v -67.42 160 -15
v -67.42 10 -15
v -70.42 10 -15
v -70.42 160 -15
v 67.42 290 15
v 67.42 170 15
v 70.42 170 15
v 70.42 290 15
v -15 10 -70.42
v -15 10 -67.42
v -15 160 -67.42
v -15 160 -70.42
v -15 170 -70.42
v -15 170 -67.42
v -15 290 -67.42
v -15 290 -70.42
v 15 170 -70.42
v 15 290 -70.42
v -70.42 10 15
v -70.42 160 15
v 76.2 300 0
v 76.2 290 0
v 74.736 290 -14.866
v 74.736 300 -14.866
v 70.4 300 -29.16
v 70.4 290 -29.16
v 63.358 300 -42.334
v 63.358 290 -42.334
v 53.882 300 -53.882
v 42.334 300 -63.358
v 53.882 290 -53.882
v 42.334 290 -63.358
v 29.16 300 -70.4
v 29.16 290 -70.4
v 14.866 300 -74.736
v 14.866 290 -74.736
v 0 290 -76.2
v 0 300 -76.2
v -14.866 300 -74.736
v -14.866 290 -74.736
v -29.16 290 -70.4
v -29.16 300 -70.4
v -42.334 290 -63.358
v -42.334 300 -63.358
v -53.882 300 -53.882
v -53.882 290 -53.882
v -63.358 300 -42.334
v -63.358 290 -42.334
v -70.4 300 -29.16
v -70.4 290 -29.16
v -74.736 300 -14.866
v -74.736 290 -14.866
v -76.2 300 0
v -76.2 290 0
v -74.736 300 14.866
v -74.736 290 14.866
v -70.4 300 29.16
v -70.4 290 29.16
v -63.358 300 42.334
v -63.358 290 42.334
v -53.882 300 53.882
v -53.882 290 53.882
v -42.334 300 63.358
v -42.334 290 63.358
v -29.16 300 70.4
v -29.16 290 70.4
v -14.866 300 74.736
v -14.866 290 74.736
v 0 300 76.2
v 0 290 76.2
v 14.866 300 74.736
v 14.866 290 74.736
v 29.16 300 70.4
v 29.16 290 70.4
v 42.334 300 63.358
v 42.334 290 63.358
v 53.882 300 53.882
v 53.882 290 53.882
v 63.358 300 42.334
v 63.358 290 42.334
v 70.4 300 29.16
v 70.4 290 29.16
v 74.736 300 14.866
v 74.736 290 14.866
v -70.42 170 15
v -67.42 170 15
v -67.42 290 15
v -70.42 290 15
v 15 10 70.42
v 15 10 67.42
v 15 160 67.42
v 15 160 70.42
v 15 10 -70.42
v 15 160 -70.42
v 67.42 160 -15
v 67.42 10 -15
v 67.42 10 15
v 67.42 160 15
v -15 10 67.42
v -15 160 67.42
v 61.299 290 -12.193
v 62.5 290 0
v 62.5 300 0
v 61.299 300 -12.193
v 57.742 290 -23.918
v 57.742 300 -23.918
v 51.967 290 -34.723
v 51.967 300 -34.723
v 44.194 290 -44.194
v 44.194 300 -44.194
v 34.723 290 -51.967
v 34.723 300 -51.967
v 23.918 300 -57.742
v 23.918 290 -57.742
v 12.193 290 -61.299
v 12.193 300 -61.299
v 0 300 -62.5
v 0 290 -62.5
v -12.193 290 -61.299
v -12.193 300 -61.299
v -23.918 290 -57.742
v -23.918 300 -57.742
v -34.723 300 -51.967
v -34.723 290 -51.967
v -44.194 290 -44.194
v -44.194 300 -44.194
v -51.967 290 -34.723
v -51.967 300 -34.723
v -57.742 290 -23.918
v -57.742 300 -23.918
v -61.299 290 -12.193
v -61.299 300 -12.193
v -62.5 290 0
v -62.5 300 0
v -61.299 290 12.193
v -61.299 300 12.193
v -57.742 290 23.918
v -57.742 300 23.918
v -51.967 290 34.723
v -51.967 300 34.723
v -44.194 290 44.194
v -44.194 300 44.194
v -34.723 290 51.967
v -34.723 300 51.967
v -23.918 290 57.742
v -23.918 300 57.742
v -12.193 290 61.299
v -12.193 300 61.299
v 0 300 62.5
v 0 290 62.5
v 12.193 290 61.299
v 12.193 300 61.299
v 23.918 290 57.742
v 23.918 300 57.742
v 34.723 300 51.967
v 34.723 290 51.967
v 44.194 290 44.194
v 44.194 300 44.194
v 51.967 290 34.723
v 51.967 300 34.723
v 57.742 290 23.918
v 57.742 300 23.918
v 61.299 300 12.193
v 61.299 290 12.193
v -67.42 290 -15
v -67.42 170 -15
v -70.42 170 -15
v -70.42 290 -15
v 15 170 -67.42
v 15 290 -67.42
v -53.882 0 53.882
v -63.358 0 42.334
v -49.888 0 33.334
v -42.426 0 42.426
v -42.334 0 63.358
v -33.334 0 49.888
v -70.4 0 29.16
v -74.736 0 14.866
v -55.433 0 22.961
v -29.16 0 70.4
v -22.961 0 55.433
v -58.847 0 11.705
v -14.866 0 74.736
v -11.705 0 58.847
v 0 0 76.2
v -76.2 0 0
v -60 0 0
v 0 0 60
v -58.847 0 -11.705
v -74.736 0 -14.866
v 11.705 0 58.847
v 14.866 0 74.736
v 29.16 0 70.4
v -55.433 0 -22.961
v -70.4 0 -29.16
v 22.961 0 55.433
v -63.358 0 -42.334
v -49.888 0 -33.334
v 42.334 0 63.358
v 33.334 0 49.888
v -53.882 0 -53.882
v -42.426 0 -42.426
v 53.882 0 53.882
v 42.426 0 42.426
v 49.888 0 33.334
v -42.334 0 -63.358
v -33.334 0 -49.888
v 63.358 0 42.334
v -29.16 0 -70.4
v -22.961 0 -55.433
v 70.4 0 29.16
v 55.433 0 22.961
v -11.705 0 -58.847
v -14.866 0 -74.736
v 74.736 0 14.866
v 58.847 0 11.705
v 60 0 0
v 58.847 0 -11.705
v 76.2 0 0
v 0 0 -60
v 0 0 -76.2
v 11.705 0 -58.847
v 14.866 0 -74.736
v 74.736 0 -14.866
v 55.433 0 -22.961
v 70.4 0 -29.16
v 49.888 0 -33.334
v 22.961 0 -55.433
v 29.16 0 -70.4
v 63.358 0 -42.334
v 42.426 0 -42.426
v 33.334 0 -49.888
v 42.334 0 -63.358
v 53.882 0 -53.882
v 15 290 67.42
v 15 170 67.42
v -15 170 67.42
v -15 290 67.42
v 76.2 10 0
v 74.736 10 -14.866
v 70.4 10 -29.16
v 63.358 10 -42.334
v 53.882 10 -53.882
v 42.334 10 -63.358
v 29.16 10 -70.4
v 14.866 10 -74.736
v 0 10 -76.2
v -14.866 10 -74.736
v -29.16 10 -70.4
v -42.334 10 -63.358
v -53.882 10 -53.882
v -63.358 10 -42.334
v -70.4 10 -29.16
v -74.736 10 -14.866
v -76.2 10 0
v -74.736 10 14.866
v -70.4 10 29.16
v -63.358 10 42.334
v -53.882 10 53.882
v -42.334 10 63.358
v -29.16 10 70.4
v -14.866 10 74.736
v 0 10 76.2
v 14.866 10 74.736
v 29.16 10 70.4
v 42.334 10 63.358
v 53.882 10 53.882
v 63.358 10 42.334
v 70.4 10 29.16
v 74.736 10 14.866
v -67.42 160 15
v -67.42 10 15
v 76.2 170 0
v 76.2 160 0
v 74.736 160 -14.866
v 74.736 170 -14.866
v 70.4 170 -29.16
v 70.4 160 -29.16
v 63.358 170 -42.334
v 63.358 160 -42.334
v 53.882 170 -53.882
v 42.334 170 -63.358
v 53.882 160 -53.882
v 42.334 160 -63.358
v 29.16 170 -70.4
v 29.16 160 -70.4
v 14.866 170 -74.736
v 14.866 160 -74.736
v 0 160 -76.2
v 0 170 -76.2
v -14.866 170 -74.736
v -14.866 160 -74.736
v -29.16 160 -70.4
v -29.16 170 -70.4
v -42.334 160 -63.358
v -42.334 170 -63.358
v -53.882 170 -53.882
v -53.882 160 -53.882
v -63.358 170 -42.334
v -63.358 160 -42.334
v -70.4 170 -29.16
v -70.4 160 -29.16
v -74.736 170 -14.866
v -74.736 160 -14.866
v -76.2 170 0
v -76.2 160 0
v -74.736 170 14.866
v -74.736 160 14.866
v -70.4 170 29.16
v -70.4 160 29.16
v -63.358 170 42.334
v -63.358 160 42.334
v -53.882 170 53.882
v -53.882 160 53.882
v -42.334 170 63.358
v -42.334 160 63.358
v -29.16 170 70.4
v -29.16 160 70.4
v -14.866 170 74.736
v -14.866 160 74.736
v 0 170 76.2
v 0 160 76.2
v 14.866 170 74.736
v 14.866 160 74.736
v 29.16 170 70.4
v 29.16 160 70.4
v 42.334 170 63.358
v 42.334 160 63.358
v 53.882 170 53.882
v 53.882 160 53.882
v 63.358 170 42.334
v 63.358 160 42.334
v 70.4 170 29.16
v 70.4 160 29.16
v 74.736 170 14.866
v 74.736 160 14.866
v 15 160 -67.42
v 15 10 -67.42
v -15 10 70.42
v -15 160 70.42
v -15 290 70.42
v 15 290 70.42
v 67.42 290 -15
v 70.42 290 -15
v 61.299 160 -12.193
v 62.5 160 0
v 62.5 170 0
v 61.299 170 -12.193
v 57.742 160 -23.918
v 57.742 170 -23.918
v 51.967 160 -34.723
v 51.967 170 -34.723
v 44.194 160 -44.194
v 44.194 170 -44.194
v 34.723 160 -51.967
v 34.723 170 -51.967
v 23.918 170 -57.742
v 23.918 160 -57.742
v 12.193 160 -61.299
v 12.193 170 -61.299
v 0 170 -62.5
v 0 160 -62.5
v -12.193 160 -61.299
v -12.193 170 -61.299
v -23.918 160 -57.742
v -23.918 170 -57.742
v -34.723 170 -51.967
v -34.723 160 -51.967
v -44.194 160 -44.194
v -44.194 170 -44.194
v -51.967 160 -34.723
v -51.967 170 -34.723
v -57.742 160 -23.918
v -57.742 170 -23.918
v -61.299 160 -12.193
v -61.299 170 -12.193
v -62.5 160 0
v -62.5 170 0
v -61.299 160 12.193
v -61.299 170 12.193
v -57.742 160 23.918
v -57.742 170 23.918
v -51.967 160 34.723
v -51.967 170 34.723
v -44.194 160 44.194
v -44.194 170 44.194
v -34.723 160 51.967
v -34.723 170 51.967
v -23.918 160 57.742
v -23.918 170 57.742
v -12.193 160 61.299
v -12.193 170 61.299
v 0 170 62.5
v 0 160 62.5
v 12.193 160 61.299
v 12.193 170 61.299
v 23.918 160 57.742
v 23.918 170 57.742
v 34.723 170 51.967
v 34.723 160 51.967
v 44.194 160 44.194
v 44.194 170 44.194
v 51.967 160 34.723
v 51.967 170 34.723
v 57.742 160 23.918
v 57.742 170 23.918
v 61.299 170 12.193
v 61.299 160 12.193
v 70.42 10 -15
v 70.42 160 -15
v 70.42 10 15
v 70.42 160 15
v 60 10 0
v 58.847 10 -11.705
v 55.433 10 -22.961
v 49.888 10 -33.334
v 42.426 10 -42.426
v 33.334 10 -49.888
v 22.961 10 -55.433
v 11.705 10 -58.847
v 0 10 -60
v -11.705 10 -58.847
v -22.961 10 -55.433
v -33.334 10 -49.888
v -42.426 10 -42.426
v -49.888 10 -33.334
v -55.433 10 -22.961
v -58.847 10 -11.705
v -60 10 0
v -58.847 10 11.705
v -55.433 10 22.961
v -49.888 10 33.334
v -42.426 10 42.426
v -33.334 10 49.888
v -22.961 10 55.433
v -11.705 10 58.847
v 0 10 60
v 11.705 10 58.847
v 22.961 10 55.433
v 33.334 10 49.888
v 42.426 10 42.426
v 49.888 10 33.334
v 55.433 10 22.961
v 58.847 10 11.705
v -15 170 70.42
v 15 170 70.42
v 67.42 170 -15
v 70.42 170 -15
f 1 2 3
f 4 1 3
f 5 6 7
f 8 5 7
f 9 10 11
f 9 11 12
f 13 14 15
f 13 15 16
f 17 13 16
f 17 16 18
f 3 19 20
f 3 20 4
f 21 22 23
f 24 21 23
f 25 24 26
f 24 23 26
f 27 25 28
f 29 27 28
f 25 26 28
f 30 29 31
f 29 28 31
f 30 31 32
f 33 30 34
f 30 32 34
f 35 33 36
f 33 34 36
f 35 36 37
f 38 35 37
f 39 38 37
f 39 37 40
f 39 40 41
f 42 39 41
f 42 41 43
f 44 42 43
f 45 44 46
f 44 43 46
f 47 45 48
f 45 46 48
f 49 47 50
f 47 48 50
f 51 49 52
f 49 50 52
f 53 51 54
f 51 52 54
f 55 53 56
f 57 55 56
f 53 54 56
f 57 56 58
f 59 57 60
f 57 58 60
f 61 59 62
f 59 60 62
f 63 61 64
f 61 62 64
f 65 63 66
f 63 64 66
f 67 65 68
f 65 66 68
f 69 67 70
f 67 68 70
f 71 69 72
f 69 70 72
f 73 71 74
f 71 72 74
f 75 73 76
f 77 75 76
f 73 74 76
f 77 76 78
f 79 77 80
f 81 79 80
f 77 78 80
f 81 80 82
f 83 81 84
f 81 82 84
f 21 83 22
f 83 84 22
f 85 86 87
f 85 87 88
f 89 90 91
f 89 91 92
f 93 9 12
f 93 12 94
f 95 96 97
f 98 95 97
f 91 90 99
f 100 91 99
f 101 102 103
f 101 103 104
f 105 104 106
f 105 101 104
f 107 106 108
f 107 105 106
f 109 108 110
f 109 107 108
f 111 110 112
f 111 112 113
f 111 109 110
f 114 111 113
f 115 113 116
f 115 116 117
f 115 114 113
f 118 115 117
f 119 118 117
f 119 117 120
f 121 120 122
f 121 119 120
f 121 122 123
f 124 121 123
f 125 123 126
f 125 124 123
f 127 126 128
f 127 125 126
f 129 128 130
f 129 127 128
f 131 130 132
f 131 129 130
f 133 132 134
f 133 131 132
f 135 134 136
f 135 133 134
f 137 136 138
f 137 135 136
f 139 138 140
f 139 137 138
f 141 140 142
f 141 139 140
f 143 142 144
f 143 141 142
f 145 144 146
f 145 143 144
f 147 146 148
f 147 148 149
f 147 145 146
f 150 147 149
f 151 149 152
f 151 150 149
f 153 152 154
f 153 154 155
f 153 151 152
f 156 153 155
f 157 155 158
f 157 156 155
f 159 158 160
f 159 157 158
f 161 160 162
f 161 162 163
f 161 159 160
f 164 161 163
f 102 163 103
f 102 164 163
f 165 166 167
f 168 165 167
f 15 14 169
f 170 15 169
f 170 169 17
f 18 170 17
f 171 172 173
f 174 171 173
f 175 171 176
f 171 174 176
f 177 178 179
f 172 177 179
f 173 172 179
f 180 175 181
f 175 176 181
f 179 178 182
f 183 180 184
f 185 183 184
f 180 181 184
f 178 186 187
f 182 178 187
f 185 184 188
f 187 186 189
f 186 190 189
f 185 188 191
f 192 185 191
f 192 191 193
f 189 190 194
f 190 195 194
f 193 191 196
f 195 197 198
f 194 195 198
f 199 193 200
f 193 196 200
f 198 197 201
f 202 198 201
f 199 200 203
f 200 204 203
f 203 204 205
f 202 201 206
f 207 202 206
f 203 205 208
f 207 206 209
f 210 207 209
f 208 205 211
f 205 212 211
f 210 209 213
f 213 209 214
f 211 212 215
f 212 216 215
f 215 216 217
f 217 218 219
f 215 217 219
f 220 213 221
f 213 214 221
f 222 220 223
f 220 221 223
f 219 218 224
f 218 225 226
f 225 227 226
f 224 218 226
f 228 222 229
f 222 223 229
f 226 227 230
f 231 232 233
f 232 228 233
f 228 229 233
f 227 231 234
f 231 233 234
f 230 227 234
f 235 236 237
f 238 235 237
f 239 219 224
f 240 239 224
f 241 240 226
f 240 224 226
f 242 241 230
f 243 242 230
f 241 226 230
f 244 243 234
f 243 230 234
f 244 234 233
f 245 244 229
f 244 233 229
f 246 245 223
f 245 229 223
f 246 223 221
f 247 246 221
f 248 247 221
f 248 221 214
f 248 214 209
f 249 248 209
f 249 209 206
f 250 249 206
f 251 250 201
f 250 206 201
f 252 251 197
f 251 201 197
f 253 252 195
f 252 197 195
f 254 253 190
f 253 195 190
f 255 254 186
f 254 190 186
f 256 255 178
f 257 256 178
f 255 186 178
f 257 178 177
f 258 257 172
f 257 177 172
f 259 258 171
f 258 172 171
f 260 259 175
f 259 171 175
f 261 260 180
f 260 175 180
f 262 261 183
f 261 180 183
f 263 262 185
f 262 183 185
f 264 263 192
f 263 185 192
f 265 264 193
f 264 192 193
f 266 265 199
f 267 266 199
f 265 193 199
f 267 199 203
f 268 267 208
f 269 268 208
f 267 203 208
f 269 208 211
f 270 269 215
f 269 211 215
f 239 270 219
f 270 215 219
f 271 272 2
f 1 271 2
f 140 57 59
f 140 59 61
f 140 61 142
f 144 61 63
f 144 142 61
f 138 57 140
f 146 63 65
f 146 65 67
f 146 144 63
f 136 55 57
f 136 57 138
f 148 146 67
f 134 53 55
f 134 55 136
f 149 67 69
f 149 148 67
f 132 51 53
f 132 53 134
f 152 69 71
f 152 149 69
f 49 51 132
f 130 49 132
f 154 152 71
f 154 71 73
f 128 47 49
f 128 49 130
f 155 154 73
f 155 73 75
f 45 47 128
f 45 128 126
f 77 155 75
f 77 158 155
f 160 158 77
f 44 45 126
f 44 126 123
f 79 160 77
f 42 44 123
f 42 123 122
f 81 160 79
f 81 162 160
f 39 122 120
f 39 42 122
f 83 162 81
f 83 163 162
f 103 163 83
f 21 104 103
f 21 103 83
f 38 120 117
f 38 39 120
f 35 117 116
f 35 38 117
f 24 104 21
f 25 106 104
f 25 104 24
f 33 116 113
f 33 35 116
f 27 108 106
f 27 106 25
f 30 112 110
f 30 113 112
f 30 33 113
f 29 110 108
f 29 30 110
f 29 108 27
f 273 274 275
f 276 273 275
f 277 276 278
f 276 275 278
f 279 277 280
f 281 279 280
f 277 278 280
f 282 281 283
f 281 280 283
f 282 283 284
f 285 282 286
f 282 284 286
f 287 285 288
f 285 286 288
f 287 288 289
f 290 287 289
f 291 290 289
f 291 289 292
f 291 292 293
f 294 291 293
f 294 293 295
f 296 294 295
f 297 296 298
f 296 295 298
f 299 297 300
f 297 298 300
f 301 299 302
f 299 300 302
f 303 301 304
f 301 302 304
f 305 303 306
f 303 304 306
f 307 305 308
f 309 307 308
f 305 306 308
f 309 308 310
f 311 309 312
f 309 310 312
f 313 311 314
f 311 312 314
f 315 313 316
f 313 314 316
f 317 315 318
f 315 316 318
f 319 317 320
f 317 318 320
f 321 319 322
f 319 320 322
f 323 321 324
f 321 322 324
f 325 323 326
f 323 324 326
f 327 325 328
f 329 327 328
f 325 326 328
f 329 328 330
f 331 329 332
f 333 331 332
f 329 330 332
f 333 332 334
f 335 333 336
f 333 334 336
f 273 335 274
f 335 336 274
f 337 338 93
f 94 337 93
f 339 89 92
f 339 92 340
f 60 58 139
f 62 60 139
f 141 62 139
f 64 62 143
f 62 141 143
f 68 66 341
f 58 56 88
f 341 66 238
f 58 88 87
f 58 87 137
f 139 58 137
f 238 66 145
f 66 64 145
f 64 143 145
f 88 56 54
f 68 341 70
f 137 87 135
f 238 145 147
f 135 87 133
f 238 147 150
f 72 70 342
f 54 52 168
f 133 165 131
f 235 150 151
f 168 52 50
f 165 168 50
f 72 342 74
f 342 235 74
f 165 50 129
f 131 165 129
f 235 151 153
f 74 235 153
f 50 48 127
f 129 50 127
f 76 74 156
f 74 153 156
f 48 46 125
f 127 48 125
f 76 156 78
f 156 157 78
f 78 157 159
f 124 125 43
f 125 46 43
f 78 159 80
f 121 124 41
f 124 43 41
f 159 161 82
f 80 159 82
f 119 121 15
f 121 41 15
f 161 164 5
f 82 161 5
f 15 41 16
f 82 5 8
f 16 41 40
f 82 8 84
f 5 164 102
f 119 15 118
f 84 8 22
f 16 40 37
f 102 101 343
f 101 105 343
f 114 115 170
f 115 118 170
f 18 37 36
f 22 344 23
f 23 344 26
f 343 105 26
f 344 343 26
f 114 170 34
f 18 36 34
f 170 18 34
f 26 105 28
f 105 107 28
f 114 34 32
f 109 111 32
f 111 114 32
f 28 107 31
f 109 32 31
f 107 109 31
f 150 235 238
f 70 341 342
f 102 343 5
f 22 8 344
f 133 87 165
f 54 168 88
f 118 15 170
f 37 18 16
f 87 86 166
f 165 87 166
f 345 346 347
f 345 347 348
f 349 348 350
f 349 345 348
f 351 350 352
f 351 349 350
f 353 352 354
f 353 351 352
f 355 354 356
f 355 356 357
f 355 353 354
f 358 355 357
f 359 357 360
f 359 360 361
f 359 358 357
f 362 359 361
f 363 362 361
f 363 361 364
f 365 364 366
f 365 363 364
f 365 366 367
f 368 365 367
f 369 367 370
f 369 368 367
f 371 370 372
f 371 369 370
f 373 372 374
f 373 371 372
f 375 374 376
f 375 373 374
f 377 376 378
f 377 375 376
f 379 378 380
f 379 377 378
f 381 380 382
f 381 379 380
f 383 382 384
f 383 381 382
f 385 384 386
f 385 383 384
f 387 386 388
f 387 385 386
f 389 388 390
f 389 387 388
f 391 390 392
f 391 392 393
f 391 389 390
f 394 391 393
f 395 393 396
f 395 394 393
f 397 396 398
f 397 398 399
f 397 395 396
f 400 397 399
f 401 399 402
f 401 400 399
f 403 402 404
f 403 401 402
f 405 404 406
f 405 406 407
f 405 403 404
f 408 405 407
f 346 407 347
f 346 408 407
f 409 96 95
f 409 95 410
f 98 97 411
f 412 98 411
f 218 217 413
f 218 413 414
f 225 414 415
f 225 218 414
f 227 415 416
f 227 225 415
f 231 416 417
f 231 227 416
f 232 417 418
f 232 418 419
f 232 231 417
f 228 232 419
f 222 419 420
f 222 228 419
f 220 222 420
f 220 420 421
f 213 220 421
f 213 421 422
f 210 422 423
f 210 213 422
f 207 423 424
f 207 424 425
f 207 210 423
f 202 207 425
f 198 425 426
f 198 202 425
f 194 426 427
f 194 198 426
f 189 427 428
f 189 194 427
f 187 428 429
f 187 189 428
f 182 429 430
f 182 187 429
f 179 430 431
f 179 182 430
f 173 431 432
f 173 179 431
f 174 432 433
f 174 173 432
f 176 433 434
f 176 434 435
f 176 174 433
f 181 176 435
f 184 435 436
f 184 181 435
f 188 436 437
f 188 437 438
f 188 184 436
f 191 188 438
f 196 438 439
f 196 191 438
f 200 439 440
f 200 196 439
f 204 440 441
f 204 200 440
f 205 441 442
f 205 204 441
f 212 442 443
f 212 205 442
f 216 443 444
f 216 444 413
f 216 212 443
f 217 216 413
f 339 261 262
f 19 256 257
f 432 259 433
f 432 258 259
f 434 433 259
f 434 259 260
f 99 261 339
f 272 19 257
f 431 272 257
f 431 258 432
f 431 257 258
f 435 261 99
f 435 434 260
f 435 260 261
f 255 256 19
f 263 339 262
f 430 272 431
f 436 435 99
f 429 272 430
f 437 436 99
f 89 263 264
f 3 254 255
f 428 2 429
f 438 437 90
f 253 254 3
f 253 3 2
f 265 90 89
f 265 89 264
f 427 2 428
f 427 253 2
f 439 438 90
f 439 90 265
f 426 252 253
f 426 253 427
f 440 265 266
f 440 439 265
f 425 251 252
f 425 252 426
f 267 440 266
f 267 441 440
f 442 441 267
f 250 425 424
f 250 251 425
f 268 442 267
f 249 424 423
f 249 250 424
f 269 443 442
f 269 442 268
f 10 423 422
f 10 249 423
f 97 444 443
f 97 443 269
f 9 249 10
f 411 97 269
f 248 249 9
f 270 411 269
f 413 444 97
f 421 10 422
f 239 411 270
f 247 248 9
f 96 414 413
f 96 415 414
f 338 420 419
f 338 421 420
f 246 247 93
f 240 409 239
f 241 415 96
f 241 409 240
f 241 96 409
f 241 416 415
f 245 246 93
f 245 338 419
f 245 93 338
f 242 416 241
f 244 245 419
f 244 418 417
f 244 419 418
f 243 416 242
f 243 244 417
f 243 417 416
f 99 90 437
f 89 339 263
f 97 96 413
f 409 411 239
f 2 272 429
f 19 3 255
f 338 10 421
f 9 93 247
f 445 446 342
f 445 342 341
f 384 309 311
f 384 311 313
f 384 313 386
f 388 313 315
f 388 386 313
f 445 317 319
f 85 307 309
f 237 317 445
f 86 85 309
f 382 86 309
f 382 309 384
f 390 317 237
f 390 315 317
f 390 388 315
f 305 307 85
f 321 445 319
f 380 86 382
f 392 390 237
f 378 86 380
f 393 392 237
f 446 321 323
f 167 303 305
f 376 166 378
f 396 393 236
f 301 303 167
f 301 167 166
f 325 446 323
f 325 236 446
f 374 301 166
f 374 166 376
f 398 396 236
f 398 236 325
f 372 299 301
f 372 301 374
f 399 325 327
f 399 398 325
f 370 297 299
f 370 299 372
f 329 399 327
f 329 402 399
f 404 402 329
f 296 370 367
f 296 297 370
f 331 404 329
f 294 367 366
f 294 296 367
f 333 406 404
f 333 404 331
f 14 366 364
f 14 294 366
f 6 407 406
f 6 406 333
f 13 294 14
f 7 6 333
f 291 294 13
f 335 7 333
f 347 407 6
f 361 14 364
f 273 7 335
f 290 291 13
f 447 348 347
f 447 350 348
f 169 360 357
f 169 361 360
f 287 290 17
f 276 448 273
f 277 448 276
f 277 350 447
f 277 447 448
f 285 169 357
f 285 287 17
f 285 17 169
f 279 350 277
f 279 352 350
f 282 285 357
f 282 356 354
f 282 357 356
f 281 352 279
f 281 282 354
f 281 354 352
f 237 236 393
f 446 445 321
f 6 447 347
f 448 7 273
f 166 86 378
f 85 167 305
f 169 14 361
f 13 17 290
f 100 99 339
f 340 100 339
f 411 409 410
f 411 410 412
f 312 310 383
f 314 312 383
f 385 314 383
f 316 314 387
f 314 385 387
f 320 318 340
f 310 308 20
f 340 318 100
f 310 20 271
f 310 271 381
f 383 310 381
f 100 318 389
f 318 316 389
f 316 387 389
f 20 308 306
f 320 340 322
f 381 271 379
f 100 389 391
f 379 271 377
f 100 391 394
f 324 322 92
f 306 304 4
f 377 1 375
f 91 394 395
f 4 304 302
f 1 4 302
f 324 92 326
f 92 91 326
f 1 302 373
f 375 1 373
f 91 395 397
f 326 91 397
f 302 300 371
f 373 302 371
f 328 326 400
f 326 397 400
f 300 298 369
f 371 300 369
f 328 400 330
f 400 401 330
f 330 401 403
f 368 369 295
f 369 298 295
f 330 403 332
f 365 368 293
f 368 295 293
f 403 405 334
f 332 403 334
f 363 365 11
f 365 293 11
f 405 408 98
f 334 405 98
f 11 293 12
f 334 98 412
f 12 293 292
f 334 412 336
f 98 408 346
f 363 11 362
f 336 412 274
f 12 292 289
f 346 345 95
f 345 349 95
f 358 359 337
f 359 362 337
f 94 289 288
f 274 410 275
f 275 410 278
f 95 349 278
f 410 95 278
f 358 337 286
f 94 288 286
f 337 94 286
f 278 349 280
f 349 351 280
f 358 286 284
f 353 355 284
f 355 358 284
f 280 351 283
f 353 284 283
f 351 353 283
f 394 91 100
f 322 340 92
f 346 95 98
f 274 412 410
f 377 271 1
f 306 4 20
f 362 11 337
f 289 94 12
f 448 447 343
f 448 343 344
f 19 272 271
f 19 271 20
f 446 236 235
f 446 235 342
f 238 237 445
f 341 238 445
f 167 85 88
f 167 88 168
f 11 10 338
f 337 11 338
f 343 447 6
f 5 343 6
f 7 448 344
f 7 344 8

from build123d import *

# Parameters (mm, degrees)
ESQUISSE1_R                  = 76.2
ESQUISSE1_R_2                = 60
BOSS_EXTRU_1_DEPTH           = 10
ESQUISSE2_W                  = 30
ESQUISSE2_H                  = 3
BOSS_EXTRU_2_DEPTH           = 290
R_P_TITION_CIRCULAIRE1_COUNT = 4
ESQUISSE5_R                  = 76.2
ESQUISSE5_R_2                = 62.5
BOSS_EXTRU_3_DEPTH           = 10
R_P_TITION_LIN_AIRE2_COUNT   = 2
R_P_TITION_LIN_AIRE2_PITCH   = 130


with BuildPart() as part:
    # Esquisse1 → Boss.-Extru.1 (new body)
    with BuildSketch(Plane(origin=(0, 0, 0), x_dir=(1, 0, 0), z_dir=(0, 1, 0))):
        Circle(ESQUISSE1_R)
        Circle(ESQUISSE1_R_2, mode=Mode.SUBTRACT)
    extrude(amount=BOSS_EXTRU_1_DEPTH)

    # Esquisse2 → Boss.-Extru.2 (add)
    with BuildSketch(Plane(origin=(0, 10, 0), x_dir=(1, 0, 0), z_dir=(0, 1, 0))):
        with Locations((0, 68.920167566)):
            Rectangle(ESQUISSE2_W, ESQUISSE2_H)
    boss_extru_2 = extrude(amount=BOSS_EXTRU_2_DEPTH)

    # Répétition circulaire1: Boss.-Extru.2 ×4 about axis
    r_p_tition_circulaire1_axis = Axis((0, 0, 0), (0, 1, 0))
    for i in range(1, R_P_TITION_CIRCULAIRE1_COUNT):
        add(boss_extru_2.rotate(r_p_tition_circulaire1_axis, i * 360 / R_P_TITION_CIRCULAIRE1_COUNT))

    # Esquisse5 → Boss.-Extru.3 (add)
    with BuildSketch(Plane(origin=(0, 160, 0), x_dir=(1, 0, 0), z_dir=(0, 1, 0))):
        Circle(ESQUISSE5_R)
        Circle(ESQUISSE5_R_2, mode=Mode.SUBTRACT)
    boss_extru_3 = extrude(amount=BOSS_EXTRU_3_DEPTH)

    # Répétition linéaire2: Boss.-Extru.3 ×2
    with Locations(*[(0, i * R_P_TITION_LIN_AIRE2_PITCH, 0) for i in range(1, R_P_TITION_LIN_AIRE2_COUNT)]):
        add(boss_extru_3)


solid = part.part
